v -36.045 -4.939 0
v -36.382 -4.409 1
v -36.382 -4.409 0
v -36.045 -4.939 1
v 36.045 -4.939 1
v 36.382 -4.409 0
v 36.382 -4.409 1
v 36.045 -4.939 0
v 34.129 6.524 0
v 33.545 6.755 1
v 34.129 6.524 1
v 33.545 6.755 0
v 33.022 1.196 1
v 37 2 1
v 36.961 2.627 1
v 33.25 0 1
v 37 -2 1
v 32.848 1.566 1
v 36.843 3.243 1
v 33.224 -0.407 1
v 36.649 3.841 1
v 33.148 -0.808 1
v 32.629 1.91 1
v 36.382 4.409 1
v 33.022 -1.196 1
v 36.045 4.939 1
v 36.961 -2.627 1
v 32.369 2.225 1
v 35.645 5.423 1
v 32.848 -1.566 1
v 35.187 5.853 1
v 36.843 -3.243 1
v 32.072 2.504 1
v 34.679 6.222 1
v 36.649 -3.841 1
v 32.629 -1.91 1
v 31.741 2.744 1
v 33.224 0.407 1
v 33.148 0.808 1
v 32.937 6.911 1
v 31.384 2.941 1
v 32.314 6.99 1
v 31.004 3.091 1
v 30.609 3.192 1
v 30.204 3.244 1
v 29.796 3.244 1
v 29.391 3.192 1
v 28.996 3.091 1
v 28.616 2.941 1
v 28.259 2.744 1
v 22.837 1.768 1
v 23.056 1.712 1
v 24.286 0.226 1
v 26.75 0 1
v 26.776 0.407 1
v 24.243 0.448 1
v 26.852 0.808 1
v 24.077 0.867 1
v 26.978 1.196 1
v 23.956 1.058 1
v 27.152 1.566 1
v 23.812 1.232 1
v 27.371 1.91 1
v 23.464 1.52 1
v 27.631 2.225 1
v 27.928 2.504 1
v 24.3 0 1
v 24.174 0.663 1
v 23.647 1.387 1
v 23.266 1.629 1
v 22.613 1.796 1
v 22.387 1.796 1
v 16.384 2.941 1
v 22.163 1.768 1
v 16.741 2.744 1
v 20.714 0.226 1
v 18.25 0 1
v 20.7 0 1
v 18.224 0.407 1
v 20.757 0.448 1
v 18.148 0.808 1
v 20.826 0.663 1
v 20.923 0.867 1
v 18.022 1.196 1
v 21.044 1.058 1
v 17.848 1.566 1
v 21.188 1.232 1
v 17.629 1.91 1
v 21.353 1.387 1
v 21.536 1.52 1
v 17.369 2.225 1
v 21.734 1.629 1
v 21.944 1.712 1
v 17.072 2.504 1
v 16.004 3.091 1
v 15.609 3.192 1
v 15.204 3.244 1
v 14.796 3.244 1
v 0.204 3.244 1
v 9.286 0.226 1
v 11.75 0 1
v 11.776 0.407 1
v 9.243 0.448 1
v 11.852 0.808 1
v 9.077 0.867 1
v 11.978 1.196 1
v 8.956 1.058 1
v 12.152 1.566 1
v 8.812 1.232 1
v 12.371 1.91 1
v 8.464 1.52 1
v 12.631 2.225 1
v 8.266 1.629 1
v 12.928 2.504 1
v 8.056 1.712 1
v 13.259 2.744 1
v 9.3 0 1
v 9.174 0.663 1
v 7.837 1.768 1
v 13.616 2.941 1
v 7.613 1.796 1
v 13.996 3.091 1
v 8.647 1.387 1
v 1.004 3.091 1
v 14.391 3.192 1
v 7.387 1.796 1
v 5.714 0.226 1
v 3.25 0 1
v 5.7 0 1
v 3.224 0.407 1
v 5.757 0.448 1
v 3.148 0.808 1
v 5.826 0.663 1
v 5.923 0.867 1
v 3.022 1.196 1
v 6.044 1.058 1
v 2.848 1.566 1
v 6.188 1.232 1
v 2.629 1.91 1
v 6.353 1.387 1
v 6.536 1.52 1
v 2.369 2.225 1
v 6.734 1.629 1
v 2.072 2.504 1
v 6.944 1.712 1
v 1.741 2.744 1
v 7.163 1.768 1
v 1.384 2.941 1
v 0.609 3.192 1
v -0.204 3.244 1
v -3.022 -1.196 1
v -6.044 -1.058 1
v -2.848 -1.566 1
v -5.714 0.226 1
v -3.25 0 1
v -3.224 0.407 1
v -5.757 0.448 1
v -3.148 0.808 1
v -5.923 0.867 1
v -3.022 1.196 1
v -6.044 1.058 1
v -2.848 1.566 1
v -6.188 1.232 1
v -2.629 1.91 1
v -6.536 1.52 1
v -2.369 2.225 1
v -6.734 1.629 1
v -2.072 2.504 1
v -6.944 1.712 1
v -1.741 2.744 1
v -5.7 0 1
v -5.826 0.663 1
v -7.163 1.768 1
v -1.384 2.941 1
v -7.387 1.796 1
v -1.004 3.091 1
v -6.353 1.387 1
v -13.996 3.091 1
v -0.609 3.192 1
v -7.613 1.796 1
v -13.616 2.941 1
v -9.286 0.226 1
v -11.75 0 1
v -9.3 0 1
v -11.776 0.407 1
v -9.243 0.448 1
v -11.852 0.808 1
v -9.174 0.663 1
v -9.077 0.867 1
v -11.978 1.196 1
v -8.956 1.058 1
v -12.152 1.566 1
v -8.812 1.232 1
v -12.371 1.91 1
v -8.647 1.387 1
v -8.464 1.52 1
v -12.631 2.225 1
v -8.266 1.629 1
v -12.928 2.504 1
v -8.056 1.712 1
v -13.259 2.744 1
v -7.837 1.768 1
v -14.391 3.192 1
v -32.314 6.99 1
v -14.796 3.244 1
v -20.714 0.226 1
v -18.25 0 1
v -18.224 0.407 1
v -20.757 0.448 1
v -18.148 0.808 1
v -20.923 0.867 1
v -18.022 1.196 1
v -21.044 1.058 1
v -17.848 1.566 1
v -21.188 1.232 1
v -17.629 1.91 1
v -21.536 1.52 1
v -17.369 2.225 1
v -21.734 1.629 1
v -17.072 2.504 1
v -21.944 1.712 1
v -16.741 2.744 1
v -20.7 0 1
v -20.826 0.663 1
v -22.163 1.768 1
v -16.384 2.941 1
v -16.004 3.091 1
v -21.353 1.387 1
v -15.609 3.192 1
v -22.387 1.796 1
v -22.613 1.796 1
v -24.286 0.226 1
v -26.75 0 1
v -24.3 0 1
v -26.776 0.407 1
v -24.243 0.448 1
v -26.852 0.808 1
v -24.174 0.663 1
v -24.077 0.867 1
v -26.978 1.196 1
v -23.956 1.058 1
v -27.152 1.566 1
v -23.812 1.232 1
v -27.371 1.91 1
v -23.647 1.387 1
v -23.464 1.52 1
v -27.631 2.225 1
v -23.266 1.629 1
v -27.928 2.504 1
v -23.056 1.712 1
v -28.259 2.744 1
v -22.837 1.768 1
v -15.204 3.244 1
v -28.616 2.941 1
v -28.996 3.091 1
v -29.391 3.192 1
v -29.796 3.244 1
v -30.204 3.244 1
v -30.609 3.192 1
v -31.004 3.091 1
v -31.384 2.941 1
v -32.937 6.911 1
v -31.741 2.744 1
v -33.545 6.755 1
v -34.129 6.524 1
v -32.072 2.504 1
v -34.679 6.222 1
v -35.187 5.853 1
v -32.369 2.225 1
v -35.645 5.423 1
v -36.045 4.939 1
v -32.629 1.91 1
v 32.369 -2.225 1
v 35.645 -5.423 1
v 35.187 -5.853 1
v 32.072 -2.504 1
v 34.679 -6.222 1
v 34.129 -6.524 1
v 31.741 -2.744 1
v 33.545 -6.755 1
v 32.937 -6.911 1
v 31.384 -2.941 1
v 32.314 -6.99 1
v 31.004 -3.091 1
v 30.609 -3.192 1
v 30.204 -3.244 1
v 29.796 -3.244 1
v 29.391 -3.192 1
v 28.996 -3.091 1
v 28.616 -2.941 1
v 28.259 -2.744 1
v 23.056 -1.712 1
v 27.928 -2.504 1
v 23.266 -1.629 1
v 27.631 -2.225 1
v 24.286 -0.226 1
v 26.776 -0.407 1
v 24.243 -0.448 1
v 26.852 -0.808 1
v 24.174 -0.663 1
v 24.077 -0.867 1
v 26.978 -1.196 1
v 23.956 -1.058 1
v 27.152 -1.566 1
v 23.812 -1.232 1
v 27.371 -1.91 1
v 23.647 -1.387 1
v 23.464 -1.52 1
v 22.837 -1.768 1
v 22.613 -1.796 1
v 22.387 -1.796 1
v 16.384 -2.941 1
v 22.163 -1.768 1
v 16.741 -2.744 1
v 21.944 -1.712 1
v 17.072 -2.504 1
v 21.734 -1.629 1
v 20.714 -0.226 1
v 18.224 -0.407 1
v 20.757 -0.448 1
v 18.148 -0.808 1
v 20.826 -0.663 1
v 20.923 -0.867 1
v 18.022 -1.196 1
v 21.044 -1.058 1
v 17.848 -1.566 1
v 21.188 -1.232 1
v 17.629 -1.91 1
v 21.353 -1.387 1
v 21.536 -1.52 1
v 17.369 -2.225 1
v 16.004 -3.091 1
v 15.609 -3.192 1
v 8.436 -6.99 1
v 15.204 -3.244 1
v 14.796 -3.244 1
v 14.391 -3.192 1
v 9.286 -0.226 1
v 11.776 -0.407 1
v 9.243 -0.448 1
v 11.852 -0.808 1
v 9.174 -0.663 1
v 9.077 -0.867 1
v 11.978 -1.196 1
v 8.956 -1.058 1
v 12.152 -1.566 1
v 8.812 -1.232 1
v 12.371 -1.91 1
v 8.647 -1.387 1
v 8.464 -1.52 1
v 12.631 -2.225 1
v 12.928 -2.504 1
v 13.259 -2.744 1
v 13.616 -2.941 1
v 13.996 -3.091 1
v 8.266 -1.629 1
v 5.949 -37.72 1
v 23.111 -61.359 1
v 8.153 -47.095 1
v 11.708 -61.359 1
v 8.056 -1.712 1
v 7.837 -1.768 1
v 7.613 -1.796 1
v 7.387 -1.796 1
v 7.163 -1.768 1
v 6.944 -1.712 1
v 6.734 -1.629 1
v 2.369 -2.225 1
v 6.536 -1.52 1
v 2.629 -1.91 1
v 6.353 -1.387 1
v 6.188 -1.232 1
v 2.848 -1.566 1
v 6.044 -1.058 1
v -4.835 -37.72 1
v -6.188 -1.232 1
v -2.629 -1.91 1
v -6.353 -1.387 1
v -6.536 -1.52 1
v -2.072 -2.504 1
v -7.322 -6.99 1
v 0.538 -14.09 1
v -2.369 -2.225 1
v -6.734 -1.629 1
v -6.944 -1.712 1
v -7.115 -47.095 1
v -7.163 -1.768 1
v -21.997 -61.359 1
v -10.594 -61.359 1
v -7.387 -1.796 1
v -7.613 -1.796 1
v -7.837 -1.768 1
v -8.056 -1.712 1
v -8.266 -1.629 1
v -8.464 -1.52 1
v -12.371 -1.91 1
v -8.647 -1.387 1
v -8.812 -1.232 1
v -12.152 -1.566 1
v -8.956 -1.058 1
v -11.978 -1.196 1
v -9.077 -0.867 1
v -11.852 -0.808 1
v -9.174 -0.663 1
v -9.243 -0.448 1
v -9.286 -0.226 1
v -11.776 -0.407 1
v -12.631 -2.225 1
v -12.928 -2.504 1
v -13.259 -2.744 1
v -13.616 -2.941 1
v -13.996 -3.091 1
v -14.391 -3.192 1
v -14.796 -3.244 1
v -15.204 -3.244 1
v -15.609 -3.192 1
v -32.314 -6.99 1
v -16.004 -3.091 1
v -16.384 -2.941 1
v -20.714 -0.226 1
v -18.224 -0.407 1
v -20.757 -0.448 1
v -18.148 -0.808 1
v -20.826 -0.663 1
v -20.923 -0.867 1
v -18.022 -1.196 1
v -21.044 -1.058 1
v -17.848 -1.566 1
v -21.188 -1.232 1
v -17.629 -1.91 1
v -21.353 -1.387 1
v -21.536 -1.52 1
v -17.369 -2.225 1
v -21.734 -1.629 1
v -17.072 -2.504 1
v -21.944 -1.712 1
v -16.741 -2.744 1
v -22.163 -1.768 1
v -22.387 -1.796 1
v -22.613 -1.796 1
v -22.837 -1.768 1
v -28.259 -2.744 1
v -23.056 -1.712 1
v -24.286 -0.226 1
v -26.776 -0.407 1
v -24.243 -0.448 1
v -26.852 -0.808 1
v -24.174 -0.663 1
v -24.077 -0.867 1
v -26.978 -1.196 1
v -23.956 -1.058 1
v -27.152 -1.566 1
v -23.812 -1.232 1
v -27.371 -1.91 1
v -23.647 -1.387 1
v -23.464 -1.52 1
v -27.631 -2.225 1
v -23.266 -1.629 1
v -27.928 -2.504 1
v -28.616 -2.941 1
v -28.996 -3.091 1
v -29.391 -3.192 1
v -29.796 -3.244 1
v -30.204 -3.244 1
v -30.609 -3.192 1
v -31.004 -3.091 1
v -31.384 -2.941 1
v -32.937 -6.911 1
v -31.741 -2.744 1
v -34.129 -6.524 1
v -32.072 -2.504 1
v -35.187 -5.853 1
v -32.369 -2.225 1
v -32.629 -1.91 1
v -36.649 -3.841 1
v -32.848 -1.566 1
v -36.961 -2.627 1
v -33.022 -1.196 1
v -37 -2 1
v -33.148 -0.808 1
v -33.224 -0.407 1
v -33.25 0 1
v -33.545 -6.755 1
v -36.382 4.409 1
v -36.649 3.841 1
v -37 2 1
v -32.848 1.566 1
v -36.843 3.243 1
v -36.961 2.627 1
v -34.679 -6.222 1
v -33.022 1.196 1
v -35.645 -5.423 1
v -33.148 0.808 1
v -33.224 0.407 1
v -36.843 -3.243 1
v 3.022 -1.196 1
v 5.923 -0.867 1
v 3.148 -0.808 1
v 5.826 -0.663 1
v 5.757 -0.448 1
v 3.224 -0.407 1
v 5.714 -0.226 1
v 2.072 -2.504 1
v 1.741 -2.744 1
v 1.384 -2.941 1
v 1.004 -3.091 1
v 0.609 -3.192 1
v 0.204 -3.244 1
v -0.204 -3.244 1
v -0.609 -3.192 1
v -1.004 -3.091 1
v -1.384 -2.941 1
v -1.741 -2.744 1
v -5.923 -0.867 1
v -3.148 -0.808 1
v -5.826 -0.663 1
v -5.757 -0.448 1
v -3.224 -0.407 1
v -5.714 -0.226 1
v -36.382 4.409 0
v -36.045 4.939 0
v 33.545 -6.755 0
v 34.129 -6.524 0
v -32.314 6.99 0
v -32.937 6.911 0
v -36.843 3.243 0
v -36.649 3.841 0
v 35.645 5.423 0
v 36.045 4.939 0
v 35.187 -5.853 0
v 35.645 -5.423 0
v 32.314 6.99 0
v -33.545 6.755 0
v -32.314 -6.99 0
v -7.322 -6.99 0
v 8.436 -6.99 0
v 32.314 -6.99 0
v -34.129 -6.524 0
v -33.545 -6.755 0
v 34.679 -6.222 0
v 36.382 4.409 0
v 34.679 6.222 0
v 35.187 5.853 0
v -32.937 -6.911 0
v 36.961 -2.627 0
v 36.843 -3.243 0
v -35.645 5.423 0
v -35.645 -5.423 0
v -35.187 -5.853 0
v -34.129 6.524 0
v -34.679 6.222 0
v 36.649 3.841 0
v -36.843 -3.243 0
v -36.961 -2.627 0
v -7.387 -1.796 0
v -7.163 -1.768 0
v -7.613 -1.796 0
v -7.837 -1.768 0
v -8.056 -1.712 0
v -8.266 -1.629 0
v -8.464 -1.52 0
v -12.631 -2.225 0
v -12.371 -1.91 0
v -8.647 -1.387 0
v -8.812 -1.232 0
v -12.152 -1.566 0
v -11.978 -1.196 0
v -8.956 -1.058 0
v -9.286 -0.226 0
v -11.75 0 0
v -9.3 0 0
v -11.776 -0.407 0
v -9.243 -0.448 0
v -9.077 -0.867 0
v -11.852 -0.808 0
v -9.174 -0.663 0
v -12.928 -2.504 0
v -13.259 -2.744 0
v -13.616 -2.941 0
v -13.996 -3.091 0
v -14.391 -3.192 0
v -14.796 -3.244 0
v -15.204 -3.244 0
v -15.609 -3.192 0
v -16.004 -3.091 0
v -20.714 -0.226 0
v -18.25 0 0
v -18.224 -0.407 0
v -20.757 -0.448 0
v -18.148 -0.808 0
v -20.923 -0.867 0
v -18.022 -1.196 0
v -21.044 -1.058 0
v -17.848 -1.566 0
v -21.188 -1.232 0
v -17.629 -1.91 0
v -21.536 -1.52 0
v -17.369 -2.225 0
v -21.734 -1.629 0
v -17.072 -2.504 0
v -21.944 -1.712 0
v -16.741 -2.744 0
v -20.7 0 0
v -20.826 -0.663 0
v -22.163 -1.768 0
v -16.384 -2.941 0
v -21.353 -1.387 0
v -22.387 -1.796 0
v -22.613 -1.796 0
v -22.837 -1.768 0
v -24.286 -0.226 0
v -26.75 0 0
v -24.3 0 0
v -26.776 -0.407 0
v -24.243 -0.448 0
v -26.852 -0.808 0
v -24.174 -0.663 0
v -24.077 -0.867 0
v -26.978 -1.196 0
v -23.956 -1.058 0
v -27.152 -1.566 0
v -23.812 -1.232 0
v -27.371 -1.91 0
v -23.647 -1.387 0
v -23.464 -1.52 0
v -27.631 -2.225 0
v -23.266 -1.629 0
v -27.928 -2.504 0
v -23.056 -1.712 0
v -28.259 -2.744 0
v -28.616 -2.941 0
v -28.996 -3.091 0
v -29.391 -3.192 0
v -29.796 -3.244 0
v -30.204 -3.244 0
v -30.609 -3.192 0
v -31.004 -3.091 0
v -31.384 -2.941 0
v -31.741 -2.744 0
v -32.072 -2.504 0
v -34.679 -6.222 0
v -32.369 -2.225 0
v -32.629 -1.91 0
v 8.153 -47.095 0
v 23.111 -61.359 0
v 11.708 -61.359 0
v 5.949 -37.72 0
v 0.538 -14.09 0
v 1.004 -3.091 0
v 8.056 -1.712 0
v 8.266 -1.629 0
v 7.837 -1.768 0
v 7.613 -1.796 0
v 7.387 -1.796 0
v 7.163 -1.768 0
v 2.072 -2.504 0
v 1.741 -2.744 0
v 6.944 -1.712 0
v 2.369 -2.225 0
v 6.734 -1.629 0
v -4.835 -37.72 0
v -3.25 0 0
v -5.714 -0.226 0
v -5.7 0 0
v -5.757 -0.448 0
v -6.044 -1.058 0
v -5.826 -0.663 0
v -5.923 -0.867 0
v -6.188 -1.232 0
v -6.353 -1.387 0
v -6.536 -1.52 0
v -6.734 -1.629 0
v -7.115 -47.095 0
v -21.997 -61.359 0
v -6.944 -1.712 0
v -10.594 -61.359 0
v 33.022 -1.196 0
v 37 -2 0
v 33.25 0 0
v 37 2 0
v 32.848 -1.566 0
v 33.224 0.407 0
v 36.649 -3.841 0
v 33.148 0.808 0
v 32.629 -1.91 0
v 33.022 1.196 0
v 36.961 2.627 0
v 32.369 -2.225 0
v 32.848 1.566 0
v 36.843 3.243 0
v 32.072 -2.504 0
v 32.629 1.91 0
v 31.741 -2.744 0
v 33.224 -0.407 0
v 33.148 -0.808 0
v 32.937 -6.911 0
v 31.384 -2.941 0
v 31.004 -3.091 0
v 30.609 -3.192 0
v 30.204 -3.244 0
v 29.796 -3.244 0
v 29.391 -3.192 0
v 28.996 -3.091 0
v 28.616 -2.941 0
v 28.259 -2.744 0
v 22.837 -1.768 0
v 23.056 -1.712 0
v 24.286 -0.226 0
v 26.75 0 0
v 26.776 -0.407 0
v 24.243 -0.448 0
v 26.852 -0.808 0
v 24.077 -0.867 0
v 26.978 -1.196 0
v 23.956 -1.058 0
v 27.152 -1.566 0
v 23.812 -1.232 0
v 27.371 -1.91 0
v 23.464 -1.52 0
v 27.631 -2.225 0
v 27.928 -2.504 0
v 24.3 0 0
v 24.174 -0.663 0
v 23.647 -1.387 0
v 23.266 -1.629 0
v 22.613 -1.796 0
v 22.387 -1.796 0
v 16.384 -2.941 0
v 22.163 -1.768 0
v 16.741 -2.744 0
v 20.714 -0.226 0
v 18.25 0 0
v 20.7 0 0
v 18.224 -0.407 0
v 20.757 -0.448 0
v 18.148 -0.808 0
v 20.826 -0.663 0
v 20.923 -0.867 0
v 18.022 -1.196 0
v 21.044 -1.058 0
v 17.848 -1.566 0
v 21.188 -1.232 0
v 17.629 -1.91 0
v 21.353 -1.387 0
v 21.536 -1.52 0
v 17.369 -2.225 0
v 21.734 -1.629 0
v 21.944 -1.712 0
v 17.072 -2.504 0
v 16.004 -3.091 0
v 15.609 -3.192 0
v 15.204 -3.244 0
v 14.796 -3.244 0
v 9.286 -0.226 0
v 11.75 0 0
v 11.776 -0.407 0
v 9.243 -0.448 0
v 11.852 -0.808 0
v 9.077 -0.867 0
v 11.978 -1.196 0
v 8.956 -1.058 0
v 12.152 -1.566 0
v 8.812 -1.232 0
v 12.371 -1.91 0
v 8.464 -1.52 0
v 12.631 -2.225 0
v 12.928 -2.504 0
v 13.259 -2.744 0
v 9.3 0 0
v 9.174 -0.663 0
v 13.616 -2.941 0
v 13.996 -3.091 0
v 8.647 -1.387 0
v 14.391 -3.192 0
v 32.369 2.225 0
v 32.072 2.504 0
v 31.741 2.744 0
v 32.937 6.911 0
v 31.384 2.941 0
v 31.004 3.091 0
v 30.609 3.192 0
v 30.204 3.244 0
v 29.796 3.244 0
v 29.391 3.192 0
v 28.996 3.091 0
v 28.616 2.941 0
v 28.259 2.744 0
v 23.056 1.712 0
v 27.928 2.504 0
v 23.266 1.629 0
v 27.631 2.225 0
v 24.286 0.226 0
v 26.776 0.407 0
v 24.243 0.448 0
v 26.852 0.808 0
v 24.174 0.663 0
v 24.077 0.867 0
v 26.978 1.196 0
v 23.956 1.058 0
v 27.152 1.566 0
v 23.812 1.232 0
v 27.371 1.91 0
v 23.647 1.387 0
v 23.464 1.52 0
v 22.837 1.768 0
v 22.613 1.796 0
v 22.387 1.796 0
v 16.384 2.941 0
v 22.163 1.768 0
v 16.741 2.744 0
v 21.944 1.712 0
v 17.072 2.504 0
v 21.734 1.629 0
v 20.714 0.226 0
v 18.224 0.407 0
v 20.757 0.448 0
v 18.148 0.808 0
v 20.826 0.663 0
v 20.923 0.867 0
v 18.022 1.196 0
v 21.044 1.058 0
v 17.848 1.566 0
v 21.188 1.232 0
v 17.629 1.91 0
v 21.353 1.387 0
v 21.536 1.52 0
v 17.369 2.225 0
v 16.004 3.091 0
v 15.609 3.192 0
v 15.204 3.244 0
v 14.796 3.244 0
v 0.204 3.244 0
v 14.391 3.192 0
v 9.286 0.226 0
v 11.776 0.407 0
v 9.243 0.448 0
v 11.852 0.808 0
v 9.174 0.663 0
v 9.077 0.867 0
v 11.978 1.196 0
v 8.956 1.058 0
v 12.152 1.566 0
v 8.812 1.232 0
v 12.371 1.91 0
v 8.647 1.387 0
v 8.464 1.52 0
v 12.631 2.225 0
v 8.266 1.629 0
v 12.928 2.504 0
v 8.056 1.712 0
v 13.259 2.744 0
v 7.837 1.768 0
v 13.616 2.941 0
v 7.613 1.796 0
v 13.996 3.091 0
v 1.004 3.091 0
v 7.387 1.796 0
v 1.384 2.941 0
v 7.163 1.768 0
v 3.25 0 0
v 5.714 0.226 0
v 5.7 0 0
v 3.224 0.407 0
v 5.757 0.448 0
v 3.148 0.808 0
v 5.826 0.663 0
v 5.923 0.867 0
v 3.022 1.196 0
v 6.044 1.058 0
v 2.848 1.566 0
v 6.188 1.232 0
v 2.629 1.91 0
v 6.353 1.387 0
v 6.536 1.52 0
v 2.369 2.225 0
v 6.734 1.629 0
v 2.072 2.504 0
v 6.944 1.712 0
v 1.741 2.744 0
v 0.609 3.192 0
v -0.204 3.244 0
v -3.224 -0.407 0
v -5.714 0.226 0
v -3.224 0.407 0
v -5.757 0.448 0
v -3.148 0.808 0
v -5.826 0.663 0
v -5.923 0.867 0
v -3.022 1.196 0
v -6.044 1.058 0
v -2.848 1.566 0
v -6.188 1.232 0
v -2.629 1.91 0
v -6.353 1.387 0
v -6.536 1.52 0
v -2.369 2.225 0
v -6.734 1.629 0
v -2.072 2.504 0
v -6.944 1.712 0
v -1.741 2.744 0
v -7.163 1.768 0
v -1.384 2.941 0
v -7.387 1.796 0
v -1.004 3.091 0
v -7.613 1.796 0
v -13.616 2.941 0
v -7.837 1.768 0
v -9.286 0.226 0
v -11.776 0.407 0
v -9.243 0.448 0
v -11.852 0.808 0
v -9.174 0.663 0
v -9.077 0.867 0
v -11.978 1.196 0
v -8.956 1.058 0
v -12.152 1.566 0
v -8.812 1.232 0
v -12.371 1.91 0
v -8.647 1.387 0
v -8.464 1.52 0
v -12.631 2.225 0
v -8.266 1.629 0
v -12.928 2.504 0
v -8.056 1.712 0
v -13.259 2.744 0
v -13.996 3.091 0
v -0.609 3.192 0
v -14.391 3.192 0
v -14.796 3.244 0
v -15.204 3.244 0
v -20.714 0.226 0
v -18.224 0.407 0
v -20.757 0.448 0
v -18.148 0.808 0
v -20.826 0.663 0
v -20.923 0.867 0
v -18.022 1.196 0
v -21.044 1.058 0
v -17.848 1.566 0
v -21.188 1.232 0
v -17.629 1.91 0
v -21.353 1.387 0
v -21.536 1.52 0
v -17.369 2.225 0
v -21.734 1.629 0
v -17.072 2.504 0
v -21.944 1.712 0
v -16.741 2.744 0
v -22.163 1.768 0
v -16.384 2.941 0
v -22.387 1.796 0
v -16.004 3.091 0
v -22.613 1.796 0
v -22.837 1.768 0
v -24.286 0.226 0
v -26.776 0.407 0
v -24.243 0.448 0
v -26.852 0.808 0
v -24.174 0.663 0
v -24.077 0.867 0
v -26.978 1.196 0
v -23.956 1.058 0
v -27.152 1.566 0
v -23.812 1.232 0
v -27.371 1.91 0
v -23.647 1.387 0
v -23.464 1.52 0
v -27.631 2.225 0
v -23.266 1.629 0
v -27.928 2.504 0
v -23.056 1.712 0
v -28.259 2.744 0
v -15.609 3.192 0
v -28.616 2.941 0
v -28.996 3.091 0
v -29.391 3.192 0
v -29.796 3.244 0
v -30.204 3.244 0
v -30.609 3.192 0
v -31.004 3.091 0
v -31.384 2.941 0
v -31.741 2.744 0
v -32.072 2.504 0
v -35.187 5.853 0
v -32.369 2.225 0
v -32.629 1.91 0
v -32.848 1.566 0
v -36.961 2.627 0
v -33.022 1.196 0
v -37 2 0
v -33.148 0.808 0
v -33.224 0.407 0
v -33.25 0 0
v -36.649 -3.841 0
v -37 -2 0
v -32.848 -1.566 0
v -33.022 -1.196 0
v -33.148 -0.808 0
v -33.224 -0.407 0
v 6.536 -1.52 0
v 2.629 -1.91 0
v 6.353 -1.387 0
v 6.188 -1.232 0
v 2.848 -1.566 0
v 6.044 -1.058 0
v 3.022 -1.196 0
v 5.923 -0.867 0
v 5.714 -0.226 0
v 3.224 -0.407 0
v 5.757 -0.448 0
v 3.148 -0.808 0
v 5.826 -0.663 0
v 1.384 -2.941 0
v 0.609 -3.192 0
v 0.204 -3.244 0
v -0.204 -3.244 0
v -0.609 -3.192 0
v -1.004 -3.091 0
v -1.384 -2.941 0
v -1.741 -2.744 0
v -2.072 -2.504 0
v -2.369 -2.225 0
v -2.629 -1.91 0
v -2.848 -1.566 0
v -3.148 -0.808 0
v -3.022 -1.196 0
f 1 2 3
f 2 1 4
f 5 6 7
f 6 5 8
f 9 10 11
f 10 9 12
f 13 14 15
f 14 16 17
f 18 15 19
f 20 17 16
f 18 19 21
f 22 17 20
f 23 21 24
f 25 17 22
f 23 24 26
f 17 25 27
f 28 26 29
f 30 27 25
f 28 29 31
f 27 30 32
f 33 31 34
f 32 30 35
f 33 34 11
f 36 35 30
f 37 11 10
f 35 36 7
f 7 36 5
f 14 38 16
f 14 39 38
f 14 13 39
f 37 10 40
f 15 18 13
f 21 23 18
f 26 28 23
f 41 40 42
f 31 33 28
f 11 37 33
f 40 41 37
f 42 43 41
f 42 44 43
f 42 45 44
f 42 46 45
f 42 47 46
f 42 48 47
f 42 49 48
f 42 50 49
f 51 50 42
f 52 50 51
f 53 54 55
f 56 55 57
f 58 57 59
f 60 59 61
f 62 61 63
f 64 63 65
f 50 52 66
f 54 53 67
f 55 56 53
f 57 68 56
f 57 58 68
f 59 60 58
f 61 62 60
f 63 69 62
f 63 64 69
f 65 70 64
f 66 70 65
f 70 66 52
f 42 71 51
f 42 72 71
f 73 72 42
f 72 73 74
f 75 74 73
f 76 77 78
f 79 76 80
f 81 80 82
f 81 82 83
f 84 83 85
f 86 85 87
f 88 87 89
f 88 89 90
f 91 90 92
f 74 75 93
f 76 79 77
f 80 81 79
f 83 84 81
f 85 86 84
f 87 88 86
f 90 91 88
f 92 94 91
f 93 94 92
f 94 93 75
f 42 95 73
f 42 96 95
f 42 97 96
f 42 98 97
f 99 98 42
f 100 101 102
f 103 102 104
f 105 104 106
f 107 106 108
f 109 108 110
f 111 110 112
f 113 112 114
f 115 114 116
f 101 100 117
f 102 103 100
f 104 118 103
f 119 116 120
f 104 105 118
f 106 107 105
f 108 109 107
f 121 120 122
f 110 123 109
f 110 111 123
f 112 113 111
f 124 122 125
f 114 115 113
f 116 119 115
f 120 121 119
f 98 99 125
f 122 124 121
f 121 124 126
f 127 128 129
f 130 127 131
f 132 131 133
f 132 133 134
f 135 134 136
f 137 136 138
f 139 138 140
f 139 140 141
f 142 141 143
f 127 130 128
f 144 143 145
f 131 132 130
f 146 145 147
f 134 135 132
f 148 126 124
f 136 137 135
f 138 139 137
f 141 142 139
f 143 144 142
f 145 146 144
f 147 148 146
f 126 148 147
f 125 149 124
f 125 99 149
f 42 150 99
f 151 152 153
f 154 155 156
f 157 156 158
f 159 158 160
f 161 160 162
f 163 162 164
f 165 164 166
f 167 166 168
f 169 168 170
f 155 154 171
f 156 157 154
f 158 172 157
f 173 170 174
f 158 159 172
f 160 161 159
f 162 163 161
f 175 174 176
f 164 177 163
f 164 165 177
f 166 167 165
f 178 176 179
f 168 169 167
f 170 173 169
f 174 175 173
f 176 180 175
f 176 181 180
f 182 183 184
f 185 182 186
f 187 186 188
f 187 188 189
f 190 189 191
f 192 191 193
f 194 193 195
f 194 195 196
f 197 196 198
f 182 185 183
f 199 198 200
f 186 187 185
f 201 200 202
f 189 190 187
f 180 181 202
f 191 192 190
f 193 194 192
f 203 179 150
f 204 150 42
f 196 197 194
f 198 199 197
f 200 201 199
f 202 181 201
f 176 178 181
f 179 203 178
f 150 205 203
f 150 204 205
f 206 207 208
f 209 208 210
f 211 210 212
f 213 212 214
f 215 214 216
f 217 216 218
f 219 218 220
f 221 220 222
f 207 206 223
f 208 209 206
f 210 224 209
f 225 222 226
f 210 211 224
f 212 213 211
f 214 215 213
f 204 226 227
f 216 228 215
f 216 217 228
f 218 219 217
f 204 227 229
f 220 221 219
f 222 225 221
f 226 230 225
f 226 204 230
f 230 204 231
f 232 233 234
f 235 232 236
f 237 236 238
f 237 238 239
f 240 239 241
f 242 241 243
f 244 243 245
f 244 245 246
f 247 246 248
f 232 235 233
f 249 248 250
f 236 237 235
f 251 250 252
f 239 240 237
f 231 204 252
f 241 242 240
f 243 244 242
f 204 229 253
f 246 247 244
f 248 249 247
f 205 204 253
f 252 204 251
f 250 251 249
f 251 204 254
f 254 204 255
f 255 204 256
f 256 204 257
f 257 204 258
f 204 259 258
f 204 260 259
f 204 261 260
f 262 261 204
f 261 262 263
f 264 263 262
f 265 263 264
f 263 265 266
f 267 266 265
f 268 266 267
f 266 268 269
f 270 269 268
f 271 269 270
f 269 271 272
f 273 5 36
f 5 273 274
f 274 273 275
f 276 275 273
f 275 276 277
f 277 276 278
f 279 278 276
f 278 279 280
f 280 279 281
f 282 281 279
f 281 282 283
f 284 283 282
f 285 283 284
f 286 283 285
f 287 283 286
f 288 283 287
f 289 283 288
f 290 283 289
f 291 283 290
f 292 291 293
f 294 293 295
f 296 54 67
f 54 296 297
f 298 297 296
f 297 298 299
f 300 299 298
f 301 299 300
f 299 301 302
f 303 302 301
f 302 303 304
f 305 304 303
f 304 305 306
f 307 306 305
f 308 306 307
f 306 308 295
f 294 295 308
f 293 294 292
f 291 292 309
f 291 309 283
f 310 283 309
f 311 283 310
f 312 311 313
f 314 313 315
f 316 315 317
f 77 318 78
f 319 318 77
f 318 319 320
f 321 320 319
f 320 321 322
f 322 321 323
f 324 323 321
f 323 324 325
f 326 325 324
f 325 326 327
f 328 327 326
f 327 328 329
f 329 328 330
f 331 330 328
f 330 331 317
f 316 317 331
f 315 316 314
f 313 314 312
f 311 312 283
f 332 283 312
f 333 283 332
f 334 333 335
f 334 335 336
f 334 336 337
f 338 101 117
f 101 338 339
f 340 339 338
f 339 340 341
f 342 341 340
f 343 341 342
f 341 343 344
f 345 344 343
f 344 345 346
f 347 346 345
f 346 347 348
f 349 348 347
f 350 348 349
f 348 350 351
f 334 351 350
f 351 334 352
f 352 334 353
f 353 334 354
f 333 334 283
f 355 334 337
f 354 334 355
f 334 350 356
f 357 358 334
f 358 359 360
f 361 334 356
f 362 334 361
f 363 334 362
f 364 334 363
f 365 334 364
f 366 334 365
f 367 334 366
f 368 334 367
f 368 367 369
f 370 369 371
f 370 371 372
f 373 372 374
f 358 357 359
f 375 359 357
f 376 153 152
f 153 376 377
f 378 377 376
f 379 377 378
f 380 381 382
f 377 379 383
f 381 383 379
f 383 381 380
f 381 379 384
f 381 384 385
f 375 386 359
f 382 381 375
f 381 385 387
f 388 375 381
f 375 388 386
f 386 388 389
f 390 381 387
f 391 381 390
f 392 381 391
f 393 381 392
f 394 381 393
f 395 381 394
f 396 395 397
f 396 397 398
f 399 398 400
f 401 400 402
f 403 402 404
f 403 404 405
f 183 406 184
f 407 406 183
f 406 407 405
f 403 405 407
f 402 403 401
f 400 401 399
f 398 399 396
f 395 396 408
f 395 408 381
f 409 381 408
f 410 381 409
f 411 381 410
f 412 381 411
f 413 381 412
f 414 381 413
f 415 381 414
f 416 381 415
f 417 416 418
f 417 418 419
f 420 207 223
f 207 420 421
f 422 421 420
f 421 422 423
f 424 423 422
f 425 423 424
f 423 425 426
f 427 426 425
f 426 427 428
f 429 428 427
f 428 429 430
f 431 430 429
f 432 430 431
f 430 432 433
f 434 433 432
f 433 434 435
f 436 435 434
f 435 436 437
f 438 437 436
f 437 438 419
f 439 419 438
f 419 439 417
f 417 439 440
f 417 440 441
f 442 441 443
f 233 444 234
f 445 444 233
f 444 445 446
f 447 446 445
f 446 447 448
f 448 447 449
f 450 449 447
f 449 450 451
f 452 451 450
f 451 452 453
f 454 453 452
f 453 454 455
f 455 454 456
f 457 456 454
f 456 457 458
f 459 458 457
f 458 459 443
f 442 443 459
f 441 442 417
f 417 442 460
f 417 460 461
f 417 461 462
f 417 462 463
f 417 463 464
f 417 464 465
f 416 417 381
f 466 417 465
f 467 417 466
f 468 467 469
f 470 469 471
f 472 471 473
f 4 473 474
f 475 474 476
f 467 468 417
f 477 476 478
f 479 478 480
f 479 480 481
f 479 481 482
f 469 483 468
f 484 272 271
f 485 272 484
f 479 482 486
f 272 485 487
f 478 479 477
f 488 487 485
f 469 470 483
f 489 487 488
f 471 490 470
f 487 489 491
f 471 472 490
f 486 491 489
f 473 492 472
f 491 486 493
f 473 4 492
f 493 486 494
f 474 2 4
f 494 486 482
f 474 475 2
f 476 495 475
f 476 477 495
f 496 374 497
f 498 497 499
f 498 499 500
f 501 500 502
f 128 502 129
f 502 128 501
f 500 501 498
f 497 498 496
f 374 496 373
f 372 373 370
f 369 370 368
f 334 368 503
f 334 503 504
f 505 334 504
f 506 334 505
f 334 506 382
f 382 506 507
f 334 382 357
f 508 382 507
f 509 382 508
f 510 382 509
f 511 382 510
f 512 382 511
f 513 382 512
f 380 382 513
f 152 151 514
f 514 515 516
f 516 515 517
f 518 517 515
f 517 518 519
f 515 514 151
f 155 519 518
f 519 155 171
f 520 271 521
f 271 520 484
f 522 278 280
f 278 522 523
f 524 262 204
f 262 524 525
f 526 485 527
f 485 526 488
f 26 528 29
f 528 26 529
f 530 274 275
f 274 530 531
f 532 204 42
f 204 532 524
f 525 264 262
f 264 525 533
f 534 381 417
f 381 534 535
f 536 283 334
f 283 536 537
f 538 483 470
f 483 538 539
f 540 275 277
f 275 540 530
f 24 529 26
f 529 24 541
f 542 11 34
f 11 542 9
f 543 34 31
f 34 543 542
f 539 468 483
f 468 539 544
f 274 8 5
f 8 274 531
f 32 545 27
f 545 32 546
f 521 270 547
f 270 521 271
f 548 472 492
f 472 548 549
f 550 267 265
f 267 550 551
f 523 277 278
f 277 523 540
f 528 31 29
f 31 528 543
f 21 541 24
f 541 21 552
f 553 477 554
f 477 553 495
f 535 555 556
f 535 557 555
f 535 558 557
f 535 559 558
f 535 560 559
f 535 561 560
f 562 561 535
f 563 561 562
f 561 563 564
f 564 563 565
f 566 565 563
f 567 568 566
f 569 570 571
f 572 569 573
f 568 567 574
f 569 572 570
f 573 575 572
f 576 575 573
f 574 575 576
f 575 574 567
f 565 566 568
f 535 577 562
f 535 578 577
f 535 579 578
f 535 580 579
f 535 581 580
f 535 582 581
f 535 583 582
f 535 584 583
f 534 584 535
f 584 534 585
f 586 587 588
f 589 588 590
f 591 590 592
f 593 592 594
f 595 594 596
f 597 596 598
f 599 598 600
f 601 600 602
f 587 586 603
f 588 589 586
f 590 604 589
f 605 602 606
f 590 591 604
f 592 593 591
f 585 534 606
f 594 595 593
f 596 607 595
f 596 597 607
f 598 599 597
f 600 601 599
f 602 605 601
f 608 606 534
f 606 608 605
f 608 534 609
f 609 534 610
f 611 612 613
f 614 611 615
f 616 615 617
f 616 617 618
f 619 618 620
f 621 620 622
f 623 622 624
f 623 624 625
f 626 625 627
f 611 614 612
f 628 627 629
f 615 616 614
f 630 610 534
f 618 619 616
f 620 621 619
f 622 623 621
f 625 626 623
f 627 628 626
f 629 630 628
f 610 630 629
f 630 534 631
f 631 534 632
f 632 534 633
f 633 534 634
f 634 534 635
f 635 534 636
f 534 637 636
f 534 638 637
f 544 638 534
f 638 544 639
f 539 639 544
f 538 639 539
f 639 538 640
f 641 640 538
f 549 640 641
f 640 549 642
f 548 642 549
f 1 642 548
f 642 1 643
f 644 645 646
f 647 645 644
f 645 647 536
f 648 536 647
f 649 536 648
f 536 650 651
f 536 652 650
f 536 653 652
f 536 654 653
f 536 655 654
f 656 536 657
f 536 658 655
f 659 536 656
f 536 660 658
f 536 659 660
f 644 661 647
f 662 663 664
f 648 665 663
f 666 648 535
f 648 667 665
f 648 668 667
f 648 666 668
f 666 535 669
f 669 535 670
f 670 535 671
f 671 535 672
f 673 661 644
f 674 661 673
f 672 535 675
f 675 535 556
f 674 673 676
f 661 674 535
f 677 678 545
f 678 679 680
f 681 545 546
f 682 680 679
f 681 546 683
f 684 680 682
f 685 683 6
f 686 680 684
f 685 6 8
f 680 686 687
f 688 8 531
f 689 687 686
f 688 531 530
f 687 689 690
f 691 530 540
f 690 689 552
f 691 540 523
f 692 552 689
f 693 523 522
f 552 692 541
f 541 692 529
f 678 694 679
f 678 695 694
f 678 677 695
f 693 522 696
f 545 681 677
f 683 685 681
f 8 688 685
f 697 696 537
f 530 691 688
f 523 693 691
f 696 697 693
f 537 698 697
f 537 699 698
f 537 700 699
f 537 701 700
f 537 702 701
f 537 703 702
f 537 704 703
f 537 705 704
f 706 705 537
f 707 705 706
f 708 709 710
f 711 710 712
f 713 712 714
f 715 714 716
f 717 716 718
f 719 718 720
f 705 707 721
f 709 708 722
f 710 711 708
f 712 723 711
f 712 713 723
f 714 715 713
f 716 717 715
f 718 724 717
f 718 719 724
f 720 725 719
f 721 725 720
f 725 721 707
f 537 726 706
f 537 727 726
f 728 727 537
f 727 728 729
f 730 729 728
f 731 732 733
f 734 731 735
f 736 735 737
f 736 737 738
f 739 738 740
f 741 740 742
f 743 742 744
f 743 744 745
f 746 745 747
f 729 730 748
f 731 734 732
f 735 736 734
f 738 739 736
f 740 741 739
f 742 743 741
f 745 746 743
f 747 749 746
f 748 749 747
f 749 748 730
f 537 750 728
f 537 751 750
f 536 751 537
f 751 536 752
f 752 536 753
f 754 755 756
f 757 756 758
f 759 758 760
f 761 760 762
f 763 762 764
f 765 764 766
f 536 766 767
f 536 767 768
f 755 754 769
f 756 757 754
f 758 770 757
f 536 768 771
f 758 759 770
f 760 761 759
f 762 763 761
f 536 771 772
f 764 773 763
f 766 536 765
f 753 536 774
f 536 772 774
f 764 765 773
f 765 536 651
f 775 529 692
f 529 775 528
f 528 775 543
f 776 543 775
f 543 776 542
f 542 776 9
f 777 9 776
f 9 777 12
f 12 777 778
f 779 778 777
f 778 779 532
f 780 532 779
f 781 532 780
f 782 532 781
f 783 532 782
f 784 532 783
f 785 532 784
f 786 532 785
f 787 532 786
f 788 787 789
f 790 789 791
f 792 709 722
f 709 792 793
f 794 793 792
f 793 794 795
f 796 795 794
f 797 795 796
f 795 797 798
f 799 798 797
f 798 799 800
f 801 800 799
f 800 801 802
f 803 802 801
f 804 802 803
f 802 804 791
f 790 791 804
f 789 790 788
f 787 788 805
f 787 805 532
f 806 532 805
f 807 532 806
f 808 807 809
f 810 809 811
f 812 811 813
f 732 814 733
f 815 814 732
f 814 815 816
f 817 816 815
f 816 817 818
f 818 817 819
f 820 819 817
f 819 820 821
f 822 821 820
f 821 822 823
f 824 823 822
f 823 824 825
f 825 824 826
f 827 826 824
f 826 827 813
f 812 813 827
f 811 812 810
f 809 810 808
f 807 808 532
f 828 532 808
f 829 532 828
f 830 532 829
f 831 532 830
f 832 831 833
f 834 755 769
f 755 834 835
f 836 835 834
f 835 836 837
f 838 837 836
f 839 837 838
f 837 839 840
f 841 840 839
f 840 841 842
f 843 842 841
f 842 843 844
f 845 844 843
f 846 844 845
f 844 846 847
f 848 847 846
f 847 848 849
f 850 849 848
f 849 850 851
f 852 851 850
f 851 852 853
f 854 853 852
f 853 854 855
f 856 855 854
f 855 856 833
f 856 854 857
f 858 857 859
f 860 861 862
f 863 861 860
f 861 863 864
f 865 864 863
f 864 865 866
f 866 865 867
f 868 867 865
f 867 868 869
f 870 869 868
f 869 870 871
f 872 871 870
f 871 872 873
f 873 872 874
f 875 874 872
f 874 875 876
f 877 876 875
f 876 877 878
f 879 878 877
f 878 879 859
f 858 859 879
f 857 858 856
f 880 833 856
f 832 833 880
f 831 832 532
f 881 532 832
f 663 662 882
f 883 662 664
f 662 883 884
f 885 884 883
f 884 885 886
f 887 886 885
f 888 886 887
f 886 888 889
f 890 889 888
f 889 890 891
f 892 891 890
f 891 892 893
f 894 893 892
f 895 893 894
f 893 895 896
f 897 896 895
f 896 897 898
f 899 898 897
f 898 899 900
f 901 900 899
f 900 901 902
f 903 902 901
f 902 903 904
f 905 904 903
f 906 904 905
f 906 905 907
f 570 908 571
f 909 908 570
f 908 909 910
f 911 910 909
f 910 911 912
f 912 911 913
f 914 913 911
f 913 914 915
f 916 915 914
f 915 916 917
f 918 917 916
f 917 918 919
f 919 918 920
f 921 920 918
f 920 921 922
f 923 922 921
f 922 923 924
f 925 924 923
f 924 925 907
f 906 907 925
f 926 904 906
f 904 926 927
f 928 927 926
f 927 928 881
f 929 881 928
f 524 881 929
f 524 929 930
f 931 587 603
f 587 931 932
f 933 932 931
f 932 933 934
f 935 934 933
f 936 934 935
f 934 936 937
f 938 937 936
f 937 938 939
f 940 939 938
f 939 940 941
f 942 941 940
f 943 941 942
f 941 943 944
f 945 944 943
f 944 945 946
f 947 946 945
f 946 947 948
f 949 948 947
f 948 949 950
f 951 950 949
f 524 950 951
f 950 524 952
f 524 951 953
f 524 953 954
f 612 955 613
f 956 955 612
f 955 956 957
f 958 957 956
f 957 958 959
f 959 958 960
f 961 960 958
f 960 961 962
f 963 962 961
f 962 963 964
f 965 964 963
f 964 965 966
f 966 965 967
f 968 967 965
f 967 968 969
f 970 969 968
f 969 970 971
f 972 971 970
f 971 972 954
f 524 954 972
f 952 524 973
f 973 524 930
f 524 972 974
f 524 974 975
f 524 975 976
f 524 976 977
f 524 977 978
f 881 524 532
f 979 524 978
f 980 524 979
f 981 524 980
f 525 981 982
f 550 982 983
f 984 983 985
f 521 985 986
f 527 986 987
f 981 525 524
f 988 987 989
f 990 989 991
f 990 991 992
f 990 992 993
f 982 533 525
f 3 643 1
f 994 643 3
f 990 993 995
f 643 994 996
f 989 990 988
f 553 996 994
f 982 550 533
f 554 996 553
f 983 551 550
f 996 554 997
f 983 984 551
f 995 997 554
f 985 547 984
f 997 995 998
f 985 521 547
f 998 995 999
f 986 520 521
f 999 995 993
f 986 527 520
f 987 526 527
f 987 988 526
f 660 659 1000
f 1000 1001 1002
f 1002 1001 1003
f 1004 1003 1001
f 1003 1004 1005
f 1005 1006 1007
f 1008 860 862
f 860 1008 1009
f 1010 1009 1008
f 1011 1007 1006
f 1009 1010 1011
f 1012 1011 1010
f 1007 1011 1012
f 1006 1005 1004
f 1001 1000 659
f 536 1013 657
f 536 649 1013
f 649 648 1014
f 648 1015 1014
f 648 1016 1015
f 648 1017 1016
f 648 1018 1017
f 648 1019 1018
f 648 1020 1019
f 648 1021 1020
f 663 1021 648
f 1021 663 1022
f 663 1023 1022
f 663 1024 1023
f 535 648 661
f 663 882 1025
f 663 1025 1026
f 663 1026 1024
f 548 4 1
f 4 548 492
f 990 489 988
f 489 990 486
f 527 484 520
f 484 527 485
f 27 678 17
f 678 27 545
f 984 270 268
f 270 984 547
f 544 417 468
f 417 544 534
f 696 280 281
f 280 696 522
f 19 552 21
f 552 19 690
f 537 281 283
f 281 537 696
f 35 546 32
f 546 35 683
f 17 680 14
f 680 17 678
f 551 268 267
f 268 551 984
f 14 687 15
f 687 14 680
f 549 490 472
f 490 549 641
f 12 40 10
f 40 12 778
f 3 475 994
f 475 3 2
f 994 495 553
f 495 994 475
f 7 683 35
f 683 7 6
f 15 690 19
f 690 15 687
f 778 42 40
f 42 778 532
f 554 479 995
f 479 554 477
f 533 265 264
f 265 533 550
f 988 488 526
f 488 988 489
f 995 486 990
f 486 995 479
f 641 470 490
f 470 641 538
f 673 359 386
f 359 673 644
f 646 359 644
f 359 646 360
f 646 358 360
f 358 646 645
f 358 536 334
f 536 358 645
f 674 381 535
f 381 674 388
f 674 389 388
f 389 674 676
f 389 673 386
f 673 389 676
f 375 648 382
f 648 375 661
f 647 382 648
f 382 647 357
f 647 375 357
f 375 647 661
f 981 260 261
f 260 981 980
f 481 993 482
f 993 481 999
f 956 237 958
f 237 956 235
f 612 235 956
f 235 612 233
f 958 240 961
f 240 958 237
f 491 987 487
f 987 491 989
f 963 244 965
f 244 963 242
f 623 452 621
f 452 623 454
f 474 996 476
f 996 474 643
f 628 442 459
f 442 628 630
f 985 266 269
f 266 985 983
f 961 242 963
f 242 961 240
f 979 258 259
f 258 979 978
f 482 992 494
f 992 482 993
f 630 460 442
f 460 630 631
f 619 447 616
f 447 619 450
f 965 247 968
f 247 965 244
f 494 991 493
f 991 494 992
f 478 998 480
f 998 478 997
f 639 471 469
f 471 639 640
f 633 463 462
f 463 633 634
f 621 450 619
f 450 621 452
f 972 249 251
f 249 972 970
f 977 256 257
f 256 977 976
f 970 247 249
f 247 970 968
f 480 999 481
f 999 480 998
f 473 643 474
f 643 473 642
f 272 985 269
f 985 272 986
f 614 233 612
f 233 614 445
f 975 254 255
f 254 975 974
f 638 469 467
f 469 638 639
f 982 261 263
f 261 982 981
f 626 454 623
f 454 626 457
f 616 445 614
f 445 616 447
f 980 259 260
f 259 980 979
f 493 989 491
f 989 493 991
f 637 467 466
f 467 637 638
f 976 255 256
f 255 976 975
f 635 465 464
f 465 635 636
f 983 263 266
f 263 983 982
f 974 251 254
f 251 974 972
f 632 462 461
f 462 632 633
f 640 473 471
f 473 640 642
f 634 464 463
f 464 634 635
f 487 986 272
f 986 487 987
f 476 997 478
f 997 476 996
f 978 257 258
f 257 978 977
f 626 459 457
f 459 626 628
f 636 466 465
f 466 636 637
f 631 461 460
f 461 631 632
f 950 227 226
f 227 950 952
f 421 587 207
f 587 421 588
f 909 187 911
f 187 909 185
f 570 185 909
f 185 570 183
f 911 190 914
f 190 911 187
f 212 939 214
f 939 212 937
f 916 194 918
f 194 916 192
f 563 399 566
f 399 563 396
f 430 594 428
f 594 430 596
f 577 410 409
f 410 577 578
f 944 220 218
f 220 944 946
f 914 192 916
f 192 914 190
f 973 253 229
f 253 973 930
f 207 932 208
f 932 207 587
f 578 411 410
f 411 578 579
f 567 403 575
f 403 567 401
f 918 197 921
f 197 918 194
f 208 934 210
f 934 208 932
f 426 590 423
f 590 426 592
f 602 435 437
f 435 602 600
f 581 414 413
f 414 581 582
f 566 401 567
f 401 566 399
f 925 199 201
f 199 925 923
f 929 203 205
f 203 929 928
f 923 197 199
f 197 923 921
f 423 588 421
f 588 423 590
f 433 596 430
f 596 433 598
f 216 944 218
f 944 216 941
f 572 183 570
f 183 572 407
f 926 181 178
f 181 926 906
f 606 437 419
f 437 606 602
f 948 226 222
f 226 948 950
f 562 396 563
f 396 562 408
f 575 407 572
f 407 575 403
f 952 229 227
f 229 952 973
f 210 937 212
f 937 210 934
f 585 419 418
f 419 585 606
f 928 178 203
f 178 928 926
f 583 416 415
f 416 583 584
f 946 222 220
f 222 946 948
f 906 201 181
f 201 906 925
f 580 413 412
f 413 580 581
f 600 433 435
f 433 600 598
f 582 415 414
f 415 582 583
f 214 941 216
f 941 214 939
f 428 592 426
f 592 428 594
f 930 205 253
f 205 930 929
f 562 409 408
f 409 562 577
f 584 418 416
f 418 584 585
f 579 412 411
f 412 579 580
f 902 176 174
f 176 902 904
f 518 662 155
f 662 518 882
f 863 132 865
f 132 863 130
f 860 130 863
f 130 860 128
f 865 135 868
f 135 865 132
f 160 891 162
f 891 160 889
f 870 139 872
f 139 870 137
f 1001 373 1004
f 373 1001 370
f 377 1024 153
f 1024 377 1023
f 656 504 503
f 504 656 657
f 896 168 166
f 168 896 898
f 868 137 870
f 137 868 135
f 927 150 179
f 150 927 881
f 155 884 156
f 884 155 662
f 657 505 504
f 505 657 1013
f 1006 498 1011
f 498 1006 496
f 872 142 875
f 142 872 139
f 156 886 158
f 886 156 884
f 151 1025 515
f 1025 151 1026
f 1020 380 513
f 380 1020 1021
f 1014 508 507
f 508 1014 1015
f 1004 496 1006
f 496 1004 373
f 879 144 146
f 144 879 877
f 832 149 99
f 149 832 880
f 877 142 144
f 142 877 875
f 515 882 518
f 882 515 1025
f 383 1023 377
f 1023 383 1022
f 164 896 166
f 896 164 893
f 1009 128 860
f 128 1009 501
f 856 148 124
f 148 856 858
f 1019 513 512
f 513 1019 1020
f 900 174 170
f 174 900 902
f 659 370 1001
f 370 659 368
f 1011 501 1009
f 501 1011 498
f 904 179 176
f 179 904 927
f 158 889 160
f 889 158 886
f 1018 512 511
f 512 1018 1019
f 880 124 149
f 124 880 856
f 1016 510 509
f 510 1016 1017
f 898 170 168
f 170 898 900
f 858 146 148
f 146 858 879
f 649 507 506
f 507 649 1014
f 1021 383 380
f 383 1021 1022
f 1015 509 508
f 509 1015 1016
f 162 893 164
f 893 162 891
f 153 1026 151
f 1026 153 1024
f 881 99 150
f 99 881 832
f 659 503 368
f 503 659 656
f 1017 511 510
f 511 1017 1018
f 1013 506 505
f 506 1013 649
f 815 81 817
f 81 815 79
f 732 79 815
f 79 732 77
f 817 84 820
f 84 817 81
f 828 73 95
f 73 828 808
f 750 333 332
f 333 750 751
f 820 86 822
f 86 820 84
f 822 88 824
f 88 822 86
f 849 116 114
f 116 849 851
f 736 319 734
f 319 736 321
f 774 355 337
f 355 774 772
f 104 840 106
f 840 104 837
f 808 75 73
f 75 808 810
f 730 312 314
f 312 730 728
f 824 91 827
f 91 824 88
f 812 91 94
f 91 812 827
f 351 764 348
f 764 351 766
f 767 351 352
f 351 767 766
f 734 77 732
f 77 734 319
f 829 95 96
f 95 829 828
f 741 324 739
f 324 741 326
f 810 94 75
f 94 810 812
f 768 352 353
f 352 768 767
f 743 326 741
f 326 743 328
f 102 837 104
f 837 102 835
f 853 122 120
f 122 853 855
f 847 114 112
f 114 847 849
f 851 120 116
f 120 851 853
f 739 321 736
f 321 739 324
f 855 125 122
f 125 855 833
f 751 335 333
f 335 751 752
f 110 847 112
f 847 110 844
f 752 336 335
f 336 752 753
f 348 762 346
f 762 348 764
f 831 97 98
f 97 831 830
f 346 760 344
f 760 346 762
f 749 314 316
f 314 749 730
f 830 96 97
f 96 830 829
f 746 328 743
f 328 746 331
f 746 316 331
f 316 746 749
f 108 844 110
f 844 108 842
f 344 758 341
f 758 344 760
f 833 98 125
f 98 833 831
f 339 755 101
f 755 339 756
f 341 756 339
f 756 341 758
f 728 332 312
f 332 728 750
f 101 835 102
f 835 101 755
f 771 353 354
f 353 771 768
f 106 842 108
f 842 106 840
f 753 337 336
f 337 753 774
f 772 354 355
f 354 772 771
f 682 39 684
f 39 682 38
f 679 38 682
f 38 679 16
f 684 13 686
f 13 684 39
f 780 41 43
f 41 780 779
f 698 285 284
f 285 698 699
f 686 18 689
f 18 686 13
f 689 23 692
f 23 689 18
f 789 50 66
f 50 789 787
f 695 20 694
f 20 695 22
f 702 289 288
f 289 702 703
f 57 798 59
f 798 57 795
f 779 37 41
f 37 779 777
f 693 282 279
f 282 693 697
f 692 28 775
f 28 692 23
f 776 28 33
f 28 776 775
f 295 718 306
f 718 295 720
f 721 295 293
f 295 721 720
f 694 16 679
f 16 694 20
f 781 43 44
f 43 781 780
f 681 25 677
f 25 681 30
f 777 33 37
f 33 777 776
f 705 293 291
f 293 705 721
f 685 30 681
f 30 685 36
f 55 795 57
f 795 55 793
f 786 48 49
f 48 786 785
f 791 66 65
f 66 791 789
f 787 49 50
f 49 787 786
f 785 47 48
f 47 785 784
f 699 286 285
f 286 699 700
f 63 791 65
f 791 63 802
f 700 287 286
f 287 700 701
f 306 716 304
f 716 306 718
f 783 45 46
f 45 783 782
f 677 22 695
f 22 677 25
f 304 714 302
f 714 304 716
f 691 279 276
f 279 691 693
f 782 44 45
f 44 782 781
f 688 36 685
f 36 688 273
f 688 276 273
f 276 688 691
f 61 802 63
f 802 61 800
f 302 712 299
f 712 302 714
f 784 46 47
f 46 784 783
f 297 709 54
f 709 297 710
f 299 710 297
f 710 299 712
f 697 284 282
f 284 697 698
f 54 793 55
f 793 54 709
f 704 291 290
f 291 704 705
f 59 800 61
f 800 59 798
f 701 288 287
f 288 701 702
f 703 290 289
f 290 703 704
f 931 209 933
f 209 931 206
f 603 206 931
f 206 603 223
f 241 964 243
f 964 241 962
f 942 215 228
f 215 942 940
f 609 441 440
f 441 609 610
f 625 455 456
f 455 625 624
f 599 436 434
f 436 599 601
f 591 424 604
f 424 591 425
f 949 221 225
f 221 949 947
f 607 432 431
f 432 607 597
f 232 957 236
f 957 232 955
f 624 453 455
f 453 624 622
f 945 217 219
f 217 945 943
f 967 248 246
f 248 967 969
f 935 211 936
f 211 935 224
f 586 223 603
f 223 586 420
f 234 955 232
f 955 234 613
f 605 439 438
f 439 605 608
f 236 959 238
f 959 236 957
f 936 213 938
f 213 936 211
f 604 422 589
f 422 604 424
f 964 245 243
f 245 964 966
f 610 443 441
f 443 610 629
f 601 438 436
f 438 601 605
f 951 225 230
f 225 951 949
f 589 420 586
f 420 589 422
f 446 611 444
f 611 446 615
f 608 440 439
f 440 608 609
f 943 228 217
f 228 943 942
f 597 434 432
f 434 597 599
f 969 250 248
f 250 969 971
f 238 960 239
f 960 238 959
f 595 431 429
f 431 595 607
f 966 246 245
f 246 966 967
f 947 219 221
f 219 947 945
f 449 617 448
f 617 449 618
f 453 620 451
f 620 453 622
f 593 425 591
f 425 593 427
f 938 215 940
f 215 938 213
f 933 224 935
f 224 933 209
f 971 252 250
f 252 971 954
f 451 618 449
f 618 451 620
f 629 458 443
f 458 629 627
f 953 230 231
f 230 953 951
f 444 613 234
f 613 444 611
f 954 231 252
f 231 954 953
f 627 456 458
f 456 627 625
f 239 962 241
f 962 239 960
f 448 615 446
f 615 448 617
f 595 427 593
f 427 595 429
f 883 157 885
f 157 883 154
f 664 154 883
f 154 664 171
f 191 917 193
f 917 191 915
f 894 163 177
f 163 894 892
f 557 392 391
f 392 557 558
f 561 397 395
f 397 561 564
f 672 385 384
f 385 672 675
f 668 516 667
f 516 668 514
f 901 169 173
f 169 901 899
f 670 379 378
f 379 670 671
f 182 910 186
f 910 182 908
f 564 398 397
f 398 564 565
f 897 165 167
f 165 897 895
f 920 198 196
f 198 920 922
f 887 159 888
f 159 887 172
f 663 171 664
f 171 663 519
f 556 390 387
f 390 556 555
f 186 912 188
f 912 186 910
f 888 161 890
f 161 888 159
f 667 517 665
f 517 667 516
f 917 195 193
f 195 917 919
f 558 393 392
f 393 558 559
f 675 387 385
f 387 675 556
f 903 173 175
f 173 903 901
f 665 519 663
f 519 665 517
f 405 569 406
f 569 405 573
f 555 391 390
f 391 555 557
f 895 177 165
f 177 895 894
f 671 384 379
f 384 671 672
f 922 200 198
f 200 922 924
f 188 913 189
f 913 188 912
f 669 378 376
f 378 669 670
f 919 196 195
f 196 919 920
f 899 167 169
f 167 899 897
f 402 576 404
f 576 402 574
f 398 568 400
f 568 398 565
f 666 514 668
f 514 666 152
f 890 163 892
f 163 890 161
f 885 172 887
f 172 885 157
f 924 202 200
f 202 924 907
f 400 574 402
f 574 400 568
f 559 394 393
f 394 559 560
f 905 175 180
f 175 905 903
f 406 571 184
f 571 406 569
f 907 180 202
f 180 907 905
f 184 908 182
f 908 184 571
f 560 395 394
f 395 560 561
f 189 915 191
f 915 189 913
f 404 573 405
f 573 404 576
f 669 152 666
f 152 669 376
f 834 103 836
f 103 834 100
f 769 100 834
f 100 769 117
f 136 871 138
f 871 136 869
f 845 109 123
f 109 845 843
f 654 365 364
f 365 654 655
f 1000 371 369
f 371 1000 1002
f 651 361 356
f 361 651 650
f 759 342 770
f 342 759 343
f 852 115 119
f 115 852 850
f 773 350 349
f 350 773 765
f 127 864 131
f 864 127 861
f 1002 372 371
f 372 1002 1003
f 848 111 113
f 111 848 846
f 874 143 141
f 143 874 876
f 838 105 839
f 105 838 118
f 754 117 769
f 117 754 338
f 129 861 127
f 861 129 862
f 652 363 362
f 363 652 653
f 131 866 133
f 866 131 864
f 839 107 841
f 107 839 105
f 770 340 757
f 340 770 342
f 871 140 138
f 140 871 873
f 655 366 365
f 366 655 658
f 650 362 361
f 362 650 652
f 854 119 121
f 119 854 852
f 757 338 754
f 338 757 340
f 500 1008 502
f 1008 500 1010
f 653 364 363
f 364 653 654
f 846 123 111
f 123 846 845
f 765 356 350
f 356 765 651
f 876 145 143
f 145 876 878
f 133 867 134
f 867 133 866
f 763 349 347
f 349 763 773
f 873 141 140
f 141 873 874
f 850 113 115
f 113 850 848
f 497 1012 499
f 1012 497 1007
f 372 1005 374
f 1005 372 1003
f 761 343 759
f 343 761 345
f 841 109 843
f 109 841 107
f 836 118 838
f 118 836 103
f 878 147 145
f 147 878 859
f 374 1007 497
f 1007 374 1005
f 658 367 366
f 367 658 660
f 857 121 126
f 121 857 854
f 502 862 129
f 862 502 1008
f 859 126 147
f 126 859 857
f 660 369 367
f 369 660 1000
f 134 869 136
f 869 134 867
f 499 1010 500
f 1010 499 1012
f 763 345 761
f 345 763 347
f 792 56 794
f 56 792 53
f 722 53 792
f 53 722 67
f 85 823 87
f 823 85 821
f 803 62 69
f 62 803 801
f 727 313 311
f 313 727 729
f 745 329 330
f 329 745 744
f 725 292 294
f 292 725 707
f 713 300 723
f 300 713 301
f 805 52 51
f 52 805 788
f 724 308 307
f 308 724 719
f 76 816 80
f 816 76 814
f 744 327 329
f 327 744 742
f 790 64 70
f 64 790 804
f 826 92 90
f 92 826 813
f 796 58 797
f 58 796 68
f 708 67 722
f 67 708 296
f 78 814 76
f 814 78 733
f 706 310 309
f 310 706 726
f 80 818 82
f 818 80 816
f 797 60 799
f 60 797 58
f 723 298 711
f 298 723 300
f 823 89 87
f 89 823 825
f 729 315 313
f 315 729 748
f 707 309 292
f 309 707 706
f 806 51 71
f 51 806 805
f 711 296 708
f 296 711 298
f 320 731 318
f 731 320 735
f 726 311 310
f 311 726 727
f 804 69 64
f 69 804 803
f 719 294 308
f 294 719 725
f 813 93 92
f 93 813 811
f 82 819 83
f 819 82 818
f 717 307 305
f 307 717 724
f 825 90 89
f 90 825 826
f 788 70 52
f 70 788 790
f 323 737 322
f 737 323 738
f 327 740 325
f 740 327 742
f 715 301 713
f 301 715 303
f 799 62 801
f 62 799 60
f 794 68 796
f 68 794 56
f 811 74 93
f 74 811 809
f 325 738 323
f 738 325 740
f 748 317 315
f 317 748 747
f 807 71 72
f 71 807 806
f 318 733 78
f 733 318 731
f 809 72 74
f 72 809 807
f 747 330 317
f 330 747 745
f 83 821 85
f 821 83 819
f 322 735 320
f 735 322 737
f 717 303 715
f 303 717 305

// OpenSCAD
$fn = 50;


difference() {
	union() {
		*color(alpha = 1.0000000000, c = "gray") {
			translate(v = [0, 14, 0]) {
				linear_extrude(height = 1) {
					text(font = "Arial:style=Bold", halign = "center", size = 4.5000000000, text = "COMMENT description oobb_plate_shape_p_type_1_depth_5_width_1_thickness_a_extra_oobb_size", valign = "center");
				}
			}
		}
		hull() {
			translate(v = [-32.0000000000, 2.0000000000, 0]) {
				cylinder(h = 1, r = 5);
			}
			translate(v = [32.0000000000, 2.0000000000, 0]) {
				cylinder(h = 1, r = 5);
			}
			translate(v = [-32.0000000000, -2.0000000000, 0]) {
				cylinder(h = 1, r = 5);
			}
			translate(v = [32.0000000000, -2.0000000000, 0]) {
				cylinder(h = 1, r = 5);
			}
		}
		translate(v = [0, -5, 0]) {
			linear_extrude(height = 1) {
				text(font = "DejaVu Sans Mono:style=Bold", halign = "center", size = 57.0000000000, text = "A", valign = "top");
			}
		}
	}
	union() {
		*color(alpha = 1.0000000000, c = "gray") {
			translate(v = [0, 14, 0]) {
				linear_extrude(height = 1) {
					text(font = "Arial:style=Bold", halign = "center", size = 4.5000000000, text = "COMMENT description oobb_holes_shape_n_type_5_width_1_thickness_a_extra_oobb_size_1_height_'all'_holes_true_both_holes", valign = "center");
				}
			}
		}
		translate(v = [-30.0000000000, 0.0000000000, 0]) {
			translate(v = [0, 0, -50]) {
				cylinder(h = 100, r = 3.2500000000);
			}
		}
		translate(v = [-15.0000000000, 0.0000000000, 0]) {
			translate(v = [0, 0, -50]) {
				cylinder(h = 100, r = 3.2500000000);
			}
		}
		translate(v = [0, 0, -50]) {
			cylinder(h = 100, r = 3.2500000000);
		}
		translate(v = [15.0000000000, 0.0000000000, 0]) {
			translate(v = [0, 0, -50]) {
				cylinder(h = 100, r = 3.2500000000);
			}
		}
		translate(v = [30.0000000000, 0.0000000000, 0]) {
			translate(v = [0, 0, -50]) {
				cylinder(h = 100, r = 3.2500000000);
			}
		}
		translate(v = [-30.0000000000, 0.0000000000, 0]) {
			translate(v = [0, 0, -50]) {
				cylinder(h = 100, r = 1.8000000000);
			}
		}
		translate(v = [-22.5000000000, 0.0000000000, 0]) {
			translate(v = [0, 0, -50]) {
				cylinder(h = 100, r = 1.8000000000);
			}
		}
		translate(v = [-15.0000000000, 0.0000000000, 0]) {
			translate(v = [0, 0, -50]) {
				cylinder(h = 100, r = 1.8000000000);
			}
		}
		translate(v = [-7.5000000000, 0.0000000000, 0]) {
			translate(v = [0, 0, -50]) {
				cylinder(h = 100, r = 1.8000000000);
			}
		}
		translate(v = [0, 0, -50]) {
			cylinder(h = 100, r = 1.8000000000);
		}
		translate(v = [7.5000000000, 0.0000000000, 0]) {
			translate(v = [0, 0, -50]) {
				cylinder(h = 100, r = 1.8000000000);
			}
		}
		translate(v = [15.0000000000, 0.0000000000, 0]) {
			translate(v = [0, 0, -50]) {
				cylinder(h = 100, r = 1.8000000000);
			}
		}
		translate(v = [22.5000000000, 0.0000000000, 0]) {
			translate(v = [0, 0, -50]) {
				cylinder(h = 100, r = 1.8000000000);
			}
		}
		translate(v = [30.0000000000, 0.0000000000, 0]) {
			translate(v = [0, 0, -50]) {
				cylinder(h = 100, r = 1.8000000000);
			}
		}
	}
}
